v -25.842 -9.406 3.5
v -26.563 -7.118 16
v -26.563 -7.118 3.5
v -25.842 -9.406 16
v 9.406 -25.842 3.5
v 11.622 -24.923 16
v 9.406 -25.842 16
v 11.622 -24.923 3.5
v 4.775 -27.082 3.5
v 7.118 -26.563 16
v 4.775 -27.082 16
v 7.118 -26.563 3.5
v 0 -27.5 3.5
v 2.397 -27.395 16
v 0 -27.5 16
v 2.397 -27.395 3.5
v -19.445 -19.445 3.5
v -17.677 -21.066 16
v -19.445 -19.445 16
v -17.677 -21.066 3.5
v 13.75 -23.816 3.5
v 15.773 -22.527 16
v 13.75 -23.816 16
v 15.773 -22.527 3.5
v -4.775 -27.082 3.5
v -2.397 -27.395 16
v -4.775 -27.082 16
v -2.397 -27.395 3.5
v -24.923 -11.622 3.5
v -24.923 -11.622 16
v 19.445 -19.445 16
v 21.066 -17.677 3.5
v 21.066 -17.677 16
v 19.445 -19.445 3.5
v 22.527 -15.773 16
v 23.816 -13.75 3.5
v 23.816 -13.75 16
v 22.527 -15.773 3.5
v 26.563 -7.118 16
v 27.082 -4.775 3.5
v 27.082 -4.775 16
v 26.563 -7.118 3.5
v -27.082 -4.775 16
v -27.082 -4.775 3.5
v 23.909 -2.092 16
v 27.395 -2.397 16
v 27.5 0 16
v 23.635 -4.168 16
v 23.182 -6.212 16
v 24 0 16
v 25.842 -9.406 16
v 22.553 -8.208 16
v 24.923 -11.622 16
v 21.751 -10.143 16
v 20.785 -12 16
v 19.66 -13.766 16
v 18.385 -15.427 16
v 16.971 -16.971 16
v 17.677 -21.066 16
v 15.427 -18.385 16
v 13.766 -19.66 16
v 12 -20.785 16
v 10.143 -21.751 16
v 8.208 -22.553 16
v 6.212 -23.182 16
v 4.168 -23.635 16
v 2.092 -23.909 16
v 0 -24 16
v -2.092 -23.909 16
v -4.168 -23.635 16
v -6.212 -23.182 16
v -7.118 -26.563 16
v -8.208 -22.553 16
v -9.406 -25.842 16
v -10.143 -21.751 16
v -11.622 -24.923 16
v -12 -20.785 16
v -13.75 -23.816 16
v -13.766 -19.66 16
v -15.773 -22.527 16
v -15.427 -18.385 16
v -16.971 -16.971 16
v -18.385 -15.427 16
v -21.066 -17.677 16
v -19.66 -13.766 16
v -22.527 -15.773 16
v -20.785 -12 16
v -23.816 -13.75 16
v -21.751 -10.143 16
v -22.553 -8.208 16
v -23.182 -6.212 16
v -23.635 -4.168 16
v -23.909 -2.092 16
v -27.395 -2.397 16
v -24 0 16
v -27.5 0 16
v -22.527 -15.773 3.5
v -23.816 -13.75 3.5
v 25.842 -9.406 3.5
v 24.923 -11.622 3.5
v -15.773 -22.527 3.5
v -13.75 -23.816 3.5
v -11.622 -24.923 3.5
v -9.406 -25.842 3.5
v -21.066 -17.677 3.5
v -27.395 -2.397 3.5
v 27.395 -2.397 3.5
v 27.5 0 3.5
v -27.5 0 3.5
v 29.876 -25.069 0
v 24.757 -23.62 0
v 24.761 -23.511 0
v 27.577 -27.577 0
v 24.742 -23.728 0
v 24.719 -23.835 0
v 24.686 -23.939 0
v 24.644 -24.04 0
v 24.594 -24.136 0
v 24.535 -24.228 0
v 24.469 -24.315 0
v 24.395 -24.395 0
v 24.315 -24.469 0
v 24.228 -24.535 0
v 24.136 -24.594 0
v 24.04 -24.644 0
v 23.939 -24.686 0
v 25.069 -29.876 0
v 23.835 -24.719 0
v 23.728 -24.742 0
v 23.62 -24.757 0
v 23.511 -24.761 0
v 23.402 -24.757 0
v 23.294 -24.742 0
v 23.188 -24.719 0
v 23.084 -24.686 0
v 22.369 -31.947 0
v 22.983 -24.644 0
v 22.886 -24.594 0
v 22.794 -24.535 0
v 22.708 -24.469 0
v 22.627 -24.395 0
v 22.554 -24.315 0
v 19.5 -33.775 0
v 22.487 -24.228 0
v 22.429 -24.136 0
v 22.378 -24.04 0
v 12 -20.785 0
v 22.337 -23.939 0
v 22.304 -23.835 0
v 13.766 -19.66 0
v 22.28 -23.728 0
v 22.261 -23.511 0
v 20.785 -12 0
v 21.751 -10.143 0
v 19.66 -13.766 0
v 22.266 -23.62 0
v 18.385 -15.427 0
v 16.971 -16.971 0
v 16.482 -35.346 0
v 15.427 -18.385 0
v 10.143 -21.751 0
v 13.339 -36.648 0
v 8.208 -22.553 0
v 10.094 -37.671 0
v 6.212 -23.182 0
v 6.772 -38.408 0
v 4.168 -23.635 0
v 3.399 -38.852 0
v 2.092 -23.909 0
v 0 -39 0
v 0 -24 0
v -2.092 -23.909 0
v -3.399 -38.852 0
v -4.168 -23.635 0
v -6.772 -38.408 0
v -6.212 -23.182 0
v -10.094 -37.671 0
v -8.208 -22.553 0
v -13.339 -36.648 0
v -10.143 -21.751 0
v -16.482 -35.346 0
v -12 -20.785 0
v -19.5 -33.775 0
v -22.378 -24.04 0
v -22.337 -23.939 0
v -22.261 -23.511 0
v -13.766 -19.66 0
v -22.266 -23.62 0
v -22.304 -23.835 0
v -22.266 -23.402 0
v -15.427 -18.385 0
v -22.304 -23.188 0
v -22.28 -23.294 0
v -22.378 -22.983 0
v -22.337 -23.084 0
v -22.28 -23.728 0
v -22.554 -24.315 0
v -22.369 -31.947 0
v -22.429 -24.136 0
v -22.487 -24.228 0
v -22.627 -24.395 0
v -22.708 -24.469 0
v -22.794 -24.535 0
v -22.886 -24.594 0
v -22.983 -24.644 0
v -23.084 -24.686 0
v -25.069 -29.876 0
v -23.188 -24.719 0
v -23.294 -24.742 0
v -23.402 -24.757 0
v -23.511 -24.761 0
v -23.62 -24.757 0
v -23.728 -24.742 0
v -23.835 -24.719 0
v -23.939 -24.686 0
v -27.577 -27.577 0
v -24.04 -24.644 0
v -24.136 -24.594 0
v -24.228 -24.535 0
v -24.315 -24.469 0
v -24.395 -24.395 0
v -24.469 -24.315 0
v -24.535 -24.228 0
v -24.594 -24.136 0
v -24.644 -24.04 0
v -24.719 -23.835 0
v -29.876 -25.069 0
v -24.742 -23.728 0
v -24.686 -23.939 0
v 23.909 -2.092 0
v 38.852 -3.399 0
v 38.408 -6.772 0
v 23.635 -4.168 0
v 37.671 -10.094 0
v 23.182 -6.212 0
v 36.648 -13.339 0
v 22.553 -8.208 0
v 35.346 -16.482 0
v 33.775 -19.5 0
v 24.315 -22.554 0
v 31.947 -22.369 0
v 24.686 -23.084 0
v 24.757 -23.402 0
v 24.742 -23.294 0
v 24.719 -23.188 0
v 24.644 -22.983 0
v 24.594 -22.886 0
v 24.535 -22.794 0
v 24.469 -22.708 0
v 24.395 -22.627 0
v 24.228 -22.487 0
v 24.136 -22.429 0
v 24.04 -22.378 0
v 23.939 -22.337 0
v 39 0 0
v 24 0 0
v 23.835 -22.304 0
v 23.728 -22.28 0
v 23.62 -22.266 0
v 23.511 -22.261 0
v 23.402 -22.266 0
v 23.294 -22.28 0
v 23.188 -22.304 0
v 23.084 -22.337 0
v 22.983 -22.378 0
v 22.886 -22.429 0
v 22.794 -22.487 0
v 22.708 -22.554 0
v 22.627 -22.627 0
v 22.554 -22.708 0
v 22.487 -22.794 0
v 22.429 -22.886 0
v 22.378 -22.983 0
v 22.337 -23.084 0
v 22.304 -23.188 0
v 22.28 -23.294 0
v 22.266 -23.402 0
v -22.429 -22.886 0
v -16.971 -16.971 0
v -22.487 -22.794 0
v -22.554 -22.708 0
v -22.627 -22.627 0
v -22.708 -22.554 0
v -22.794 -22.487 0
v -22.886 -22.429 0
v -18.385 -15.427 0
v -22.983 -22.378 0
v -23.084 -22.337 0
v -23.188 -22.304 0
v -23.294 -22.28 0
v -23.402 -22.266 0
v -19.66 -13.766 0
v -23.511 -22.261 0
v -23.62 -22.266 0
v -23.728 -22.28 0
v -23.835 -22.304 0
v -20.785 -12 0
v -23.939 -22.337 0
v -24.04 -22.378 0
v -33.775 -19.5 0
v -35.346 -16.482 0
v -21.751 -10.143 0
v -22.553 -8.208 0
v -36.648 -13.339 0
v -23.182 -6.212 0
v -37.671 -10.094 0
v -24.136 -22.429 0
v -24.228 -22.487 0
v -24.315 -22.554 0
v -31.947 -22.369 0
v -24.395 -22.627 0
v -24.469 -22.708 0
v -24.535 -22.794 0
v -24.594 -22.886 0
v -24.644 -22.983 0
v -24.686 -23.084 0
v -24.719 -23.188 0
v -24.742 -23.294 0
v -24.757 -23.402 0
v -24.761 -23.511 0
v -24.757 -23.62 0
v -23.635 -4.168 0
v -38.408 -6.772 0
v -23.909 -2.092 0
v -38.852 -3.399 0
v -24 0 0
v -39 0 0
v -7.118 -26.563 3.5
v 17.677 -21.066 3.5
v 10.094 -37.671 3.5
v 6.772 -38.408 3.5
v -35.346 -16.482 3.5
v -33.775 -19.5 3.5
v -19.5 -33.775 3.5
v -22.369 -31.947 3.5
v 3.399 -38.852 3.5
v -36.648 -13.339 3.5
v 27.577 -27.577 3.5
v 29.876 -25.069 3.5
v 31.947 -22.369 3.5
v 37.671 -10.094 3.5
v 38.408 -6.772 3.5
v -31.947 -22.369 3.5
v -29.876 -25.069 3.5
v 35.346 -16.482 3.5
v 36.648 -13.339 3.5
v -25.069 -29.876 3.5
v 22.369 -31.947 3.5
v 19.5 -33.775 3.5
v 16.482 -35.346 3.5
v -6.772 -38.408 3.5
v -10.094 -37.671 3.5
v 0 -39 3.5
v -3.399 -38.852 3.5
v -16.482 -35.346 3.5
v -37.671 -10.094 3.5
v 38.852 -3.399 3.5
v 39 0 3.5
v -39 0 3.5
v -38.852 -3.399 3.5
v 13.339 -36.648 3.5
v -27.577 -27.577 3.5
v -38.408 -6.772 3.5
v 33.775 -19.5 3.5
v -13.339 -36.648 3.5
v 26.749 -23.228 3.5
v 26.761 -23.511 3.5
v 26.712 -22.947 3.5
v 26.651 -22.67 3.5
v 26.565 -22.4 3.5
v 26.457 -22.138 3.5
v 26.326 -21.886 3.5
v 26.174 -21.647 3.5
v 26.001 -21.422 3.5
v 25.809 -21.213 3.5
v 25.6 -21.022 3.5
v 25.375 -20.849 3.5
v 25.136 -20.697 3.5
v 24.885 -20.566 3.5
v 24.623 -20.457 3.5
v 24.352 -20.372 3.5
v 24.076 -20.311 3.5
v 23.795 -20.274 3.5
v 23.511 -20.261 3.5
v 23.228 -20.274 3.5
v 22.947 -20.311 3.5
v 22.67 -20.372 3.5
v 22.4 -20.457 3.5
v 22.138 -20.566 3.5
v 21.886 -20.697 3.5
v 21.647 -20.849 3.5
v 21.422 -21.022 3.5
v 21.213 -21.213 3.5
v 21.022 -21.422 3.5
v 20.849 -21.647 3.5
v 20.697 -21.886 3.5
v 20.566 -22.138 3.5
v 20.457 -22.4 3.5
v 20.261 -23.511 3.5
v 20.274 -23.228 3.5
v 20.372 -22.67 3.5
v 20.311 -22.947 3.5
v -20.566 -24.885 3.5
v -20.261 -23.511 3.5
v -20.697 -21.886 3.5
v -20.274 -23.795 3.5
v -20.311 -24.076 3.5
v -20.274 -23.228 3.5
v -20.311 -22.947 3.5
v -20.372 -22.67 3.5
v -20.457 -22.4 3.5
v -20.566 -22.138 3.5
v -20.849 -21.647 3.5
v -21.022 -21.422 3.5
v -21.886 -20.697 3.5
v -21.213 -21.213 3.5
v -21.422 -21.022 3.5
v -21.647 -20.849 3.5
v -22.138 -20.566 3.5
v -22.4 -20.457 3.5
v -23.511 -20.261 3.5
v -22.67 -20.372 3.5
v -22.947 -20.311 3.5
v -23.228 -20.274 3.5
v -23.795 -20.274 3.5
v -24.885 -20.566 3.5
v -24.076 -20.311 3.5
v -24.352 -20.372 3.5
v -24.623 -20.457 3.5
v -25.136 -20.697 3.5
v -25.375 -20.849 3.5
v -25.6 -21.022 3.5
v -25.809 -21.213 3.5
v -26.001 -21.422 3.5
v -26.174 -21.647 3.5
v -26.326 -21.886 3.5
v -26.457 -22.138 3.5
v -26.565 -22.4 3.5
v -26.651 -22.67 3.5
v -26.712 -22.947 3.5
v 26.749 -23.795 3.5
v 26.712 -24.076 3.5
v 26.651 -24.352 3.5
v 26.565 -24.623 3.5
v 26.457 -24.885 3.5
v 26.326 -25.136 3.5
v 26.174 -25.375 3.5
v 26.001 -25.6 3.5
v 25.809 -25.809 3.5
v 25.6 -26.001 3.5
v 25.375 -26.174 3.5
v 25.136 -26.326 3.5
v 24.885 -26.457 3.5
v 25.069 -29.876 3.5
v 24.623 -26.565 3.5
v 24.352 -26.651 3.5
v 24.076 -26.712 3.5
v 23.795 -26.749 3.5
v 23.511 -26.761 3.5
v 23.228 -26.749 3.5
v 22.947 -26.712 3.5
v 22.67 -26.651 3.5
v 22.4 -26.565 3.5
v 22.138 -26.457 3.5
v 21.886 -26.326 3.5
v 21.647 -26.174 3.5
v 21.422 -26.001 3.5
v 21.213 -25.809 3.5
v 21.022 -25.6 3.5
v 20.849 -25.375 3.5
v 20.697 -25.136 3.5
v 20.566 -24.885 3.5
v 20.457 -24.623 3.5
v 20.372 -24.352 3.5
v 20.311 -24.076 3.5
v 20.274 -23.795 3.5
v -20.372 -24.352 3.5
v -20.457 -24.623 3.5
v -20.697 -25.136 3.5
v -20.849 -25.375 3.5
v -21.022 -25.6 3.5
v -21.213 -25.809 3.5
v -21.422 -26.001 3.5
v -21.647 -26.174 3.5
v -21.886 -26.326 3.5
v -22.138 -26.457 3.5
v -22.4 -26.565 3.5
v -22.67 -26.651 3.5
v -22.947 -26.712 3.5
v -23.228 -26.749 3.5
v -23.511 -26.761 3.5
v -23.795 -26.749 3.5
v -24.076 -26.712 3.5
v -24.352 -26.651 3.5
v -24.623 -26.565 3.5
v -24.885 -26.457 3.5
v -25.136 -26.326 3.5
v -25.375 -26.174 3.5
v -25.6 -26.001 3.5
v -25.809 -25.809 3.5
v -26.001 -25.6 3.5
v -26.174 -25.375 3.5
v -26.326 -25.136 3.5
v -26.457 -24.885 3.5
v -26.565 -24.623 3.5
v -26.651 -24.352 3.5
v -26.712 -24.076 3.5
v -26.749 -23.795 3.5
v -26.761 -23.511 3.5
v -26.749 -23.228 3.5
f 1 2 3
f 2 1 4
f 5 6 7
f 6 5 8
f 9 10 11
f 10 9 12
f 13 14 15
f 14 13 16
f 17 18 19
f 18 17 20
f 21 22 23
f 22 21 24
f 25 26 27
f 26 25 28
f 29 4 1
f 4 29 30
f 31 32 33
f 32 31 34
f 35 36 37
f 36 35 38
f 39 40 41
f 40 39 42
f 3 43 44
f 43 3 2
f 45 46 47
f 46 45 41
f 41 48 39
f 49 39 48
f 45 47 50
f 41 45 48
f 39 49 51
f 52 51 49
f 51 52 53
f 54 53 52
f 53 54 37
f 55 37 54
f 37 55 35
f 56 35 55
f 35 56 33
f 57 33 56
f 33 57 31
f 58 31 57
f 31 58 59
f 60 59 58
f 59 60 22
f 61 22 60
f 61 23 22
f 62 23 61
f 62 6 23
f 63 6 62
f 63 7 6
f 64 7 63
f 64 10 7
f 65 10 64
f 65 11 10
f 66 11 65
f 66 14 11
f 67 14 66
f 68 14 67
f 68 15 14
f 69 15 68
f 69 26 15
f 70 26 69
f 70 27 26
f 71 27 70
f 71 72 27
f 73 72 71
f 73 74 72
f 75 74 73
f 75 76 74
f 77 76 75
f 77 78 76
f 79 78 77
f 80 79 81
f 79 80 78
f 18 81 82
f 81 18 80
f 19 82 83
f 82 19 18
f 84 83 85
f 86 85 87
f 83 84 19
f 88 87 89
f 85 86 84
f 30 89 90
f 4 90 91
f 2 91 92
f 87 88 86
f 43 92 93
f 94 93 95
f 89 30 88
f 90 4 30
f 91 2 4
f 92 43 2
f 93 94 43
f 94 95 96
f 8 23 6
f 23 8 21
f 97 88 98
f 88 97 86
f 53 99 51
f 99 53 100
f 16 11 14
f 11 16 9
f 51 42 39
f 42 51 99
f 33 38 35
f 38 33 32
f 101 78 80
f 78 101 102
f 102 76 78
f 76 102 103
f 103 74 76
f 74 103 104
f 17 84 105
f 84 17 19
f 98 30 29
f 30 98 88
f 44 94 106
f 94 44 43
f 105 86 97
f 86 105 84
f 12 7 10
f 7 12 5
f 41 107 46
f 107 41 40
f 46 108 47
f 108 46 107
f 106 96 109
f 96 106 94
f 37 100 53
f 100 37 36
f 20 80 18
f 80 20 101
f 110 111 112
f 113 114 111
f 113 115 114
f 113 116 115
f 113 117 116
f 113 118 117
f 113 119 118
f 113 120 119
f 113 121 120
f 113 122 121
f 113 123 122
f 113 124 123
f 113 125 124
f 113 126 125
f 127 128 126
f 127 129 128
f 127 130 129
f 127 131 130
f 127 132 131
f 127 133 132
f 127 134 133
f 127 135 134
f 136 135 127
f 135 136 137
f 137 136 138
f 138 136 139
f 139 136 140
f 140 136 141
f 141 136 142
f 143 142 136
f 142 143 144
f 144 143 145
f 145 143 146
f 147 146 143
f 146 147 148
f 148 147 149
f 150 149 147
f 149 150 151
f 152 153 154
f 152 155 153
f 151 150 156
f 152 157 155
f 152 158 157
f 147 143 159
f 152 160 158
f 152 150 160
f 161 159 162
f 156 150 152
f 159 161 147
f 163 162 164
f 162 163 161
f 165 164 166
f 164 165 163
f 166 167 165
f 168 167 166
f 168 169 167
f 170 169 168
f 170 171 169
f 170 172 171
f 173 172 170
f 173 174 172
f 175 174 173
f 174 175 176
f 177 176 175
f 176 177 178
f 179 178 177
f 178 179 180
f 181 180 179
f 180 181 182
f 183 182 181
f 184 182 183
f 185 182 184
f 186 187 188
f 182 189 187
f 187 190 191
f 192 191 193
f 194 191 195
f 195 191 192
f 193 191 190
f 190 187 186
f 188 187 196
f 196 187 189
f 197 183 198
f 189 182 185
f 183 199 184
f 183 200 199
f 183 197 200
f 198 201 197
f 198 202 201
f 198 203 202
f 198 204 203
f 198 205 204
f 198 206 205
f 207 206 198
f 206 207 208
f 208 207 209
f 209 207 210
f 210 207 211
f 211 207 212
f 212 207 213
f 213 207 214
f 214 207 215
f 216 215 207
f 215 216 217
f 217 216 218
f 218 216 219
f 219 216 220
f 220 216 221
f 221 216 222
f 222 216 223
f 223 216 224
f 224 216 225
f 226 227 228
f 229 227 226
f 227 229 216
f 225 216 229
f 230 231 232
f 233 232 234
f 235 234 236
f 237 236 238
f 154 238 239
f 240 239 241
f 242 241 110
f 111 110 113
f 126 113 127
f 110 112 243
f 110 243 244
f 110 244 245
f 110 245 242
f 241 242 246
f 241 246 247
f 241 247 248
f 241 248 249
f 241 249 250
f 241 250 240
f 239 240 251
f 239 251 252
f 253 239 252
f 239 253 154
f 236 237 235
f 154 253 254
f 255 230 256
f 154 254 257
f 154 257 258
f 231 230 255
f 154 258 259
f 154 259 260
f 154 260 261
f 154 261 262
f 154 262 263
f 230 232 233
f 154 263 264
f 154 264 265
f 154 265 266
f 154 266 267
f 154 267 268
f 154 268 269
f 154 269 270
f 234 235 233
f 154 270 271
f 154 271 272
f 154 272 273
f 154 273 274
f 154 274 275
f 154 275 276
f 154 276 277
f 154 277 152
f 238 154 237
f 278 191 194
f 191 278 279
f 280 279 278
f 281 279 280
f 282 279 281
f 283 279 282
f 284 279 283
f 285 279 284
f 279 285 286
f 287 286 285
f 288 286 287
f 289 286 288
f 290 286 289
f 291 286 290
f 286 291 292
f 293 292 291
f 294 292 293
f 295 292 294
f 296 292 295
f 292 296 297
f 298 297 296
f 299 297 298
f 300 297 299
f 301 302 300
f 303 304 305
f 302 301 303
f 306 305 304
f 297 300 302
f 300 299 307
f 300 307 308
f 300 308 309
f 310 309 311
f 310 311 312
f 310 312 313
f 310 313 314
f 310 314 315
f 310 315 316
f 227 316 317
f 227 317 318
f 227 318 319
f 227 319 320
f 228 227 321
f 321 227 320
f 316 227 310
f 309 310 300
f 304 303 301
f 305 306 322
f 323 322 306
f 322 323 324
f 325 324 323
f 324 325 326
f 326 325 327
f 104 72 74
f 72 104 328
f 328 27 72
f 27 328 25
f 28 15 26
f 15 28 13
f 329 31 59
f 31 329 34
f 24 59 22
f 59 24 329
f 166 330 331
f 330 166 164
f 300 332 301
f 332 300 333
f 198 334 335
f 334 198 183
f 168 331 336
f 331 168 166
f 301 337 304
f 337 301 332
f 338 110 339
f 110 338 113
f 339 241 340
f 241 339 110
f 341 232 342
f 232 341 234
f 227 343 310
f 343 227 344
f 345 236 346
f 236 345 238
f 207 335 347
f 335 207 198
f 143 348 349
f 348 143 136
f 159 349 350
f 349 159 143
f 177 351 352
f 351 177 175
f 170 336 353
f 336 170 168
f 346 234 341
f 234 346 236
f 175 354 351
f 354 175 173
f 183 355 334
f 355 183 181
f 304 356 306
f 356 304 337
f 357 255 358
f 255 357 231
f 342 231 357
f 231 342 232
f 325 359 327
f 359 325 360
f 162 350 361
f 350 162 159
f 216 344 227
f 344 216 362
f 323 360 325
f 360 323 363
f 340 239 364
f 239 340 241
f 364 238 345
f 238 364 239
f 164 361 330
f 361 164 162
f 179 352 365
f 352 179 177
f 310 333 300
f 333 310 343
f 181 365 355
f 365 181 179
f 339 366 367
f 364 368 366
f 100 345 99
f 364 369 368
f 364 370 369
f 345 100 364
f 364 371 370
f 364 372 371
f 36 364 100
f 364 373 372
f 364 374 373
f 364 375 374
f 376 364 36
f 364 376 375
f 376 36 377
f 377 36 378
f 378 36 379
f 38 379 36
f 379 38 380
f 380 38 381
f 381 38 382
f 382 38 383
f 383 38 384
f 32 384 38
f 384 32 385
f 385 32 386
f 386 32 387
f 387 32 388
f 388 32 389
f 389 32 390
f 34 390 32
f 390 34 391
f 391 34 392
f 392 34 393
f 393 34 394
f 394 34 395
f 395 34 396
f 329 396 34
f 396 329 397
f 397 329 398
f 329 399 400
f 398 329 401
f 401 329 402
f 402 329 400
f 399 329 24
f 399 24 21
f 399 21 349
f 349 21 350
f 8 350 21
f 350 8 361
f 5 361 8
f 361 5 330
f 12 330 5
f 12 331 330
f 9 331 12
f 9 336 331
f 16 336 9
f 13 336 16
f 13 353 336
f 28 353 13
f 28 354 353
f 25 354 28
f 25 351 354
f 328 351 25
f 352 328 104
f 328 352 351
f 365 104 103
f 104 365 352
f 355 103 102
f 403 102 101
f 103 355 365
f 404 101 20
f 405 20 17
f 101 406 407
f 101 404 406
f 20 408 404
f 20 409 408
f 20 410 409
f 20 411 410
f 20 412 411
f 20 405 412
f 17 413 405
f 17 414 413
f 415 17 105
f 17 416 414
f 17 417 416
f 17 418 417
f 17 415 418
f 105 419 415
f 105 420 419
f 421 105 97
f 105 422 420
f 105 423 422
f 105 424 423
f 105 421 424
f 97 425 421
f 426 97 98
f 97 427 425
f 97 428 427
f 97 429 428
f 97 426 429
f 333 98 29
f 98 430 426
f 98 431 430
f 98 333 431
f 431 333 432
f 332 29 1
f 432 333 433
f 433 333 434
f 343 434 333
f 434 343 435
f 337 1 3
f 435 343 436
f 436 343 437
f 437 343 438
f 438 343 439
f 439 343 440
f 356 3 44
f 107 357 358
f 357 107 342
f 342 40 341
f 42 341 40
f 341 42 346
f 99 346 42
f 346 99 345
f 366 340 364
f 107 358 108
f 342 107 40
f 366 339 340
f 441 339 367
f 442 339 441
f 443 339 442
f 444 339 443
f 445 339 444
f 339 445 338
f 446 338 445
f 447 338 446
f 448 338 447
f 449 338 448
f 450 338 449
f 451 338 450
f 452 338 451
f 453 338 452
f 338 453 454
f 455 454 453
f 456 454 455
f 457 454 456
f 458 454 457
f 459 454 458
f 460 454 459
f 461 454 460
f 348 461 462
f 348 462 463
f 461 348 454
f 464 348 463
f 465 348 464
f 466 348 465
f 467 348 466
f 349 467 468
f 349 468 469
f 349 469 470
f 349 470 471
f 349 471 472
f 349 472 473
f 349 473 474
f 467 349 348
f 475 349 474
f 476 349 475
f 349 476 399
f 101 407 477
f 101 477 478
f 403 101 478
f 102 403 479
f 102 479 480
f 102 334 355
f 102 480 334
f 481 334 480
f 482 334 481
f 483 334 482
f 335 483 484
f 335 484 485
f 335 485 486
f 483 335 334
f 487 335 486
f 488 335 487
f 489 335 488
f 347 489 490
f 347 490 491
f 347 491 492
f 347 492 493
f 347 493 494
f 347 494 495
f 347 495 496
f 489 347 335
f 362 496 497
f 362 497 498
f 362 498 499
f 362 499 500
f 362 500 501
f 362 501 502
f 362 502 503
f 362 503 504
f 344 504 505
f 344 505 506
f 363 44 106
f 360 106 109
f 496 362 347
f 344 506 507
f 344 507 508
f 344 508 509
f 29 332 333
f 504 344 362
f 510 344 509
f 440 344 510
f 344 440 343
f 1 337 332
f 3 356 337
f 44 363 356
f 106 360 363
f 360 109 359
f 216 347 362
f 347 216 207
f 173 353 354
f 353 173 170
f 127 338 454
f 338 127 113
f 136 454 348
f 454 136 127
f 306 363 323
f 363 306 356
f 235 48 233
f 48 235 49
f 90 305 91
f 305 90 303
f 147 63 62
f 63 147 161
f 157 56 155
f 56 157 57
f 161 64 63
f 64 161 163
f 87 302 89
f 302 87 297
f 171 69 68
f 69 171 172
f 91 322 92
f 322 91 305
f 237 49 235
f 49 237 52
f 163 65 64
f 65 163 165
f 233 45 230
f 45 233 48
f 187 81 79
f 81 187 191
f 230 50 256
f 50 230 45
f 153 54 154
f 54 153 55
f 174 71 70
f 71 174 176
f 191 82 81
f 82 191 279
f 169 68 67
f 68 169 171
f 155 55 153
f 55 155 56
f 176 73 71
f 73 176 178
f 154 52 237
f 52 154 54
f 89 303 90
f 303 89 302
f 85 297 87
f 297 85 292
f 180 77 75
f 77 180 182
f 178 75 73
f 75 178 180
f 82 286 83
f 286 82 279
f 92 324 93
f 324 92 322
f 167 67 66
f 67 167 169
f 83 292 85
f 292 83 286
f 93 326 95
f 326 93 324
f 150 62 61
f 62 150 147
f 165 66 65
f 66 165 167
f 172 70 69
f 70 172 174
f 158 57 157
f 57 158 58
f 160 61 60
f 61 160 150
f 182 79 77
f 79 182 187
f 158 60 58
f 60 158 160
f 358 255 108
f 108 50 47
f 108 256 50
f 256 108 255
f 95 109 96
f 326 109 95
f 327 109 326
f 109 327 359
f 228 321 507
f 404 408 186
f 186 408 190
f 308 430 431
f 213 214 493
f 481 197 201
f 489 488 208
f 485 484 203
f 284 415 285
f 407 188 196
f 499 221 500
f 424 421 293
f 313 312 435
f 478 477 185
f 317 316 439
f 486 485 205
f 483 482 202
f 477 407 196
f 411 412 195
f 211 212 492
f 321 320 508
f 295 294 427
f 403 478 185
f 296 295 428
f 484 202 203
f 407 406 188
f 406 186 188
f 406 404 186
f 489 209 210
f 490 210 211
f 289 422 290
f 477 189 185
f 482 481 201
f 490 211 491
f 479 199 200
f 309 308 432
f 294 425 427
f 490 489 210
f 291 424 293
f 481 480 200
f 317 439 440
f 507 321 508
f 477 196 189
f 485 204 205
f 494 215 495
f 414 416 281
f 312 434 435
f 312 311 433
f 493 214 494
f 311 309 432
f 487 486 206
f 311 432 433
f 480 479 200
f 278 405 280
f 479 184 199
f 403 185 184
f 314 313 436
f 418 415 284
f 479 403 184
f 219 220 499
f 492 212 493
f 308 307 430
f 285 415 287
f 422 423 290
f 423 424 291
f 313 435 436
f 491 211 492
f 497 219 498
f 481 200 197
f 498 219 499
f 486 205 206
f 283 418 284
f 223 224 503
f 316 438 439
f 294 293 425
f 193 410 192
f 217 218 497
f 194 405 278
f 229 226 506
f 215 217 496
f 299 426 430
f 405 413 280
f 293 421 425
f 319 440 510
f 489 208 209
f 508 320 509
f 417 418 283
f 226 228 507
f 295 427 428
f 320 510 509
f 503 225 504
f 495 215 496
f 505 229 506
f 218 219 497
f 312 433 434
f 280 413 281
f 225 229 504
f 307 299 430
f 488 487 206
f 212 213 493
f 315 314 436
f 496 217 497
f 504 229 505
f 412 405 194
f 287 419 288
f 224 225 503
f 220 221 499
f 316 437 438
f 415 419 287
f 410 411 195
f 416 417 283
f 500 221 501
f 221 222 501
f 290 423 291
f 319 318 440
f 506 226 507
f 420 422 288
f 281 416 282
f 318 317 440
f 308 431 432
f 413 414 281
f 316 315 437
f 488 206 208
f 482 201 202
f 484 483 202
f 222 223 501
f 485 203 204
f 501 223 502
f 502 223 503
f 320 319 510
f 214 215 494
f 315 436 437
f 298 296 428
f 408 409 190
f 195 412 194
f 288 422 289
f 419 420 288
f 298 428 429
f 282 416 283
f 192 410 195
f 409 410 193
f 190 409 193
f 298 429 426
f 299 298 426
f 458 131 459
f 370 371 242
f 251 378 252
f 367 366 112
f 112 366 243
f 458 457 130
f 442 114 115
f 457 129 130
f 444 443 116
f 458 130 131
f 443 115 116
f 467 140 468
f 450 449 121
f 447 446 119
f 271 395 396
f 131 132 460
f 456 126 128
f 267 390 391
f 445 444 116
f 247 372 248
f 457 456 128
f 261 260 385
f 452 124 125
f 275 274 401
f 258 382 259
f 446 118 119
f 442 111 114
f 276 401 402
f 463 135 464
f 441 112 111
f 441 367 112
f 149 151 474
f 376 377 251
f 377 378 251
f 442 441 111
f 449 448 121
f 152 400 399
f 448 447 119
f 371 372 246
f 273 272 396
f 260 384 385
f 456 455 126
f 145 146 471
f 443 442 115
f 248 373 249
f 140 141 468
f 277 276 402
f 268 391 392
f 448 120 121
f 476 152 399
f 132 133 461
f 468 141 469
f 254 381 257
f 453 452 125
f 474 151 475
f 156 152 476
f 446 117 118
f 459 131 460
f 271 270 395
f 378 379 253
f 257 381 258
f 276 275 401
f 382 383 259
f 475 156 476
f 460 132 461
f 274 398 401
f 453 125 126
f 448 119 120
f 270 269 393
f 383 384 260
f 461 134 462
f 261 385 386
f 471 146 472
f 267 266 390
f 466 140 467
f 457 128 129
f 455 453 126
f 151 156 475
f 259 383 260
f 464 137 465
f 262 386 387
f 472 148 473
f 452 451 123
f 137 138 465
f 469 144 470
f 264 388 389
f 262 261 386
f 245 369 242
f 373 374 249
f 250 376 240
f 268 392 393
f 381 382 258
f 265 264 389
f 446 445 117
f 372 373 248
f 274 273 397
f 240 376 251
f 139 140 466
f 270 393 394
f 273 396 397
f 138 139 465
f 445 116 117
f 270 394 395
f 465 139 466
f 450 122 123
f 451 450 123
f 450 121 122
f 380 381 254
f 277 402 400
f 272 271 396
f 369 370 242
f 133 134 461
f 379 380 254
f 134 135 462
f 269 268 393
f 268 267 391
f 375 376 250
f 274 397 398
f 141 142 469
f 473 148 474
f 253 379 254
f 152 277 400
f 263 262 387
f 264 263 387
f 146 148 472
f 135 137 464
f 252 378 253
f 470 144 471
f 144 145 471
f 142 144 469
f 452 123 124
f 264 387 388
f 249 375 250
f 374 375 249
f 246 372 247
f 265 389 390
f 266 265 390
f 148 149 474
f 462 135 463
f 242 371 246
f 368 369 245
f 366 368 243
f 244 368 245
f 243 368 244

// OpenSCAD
$fn = 72;

h = 32;
d = 48;

t = 3.5;
ts = 2.5;
ds = 6.5;

d2 = d + t * 2;
dt = h / 2 + t * 2;
d3 = d2 + dt;
d4 = d3 / 2 - dt / 4;

module foot()
{
    color("gray") cylinder(h = h, d = d);
}

module holderfull()
{
    cylinder(h = h / 2, d = d2);
    cylinder(h = t, d = d3);
}

module holderempty()
{
    difference()
    {
        holderfull();
        foot();
    }
}

module cutterblock()
{
    // cut half
    translate([ -d3 / 2, 0, 0 ]) cube([ d3, d3 / 2, h ]);

    // cut quarter
    // translate([0, -d3/2,0])
    // cube([d3, d3/2, h]);
}

module holderhalf()
{
    difference()
    {
        holderempty();
        cutterblock();
    }
}

y = sin(45);
x = cos(45);

module screw()
{
    color("red") cylinder(h = t, d1 = ts, d2 = ds);
}

module screw1()
{
    translate([ -d4 * x, -d4 * y, 0 ]) screw();
}

module screw2()
{
    translate([ d4 * x, -d4 * y, 0 ]) screw();
}

module screws()
{
    screw1();
    screw2();
}

module holder()
{
    difference()
    {
        holderhalf();
        screws();
    }
}

holder();
